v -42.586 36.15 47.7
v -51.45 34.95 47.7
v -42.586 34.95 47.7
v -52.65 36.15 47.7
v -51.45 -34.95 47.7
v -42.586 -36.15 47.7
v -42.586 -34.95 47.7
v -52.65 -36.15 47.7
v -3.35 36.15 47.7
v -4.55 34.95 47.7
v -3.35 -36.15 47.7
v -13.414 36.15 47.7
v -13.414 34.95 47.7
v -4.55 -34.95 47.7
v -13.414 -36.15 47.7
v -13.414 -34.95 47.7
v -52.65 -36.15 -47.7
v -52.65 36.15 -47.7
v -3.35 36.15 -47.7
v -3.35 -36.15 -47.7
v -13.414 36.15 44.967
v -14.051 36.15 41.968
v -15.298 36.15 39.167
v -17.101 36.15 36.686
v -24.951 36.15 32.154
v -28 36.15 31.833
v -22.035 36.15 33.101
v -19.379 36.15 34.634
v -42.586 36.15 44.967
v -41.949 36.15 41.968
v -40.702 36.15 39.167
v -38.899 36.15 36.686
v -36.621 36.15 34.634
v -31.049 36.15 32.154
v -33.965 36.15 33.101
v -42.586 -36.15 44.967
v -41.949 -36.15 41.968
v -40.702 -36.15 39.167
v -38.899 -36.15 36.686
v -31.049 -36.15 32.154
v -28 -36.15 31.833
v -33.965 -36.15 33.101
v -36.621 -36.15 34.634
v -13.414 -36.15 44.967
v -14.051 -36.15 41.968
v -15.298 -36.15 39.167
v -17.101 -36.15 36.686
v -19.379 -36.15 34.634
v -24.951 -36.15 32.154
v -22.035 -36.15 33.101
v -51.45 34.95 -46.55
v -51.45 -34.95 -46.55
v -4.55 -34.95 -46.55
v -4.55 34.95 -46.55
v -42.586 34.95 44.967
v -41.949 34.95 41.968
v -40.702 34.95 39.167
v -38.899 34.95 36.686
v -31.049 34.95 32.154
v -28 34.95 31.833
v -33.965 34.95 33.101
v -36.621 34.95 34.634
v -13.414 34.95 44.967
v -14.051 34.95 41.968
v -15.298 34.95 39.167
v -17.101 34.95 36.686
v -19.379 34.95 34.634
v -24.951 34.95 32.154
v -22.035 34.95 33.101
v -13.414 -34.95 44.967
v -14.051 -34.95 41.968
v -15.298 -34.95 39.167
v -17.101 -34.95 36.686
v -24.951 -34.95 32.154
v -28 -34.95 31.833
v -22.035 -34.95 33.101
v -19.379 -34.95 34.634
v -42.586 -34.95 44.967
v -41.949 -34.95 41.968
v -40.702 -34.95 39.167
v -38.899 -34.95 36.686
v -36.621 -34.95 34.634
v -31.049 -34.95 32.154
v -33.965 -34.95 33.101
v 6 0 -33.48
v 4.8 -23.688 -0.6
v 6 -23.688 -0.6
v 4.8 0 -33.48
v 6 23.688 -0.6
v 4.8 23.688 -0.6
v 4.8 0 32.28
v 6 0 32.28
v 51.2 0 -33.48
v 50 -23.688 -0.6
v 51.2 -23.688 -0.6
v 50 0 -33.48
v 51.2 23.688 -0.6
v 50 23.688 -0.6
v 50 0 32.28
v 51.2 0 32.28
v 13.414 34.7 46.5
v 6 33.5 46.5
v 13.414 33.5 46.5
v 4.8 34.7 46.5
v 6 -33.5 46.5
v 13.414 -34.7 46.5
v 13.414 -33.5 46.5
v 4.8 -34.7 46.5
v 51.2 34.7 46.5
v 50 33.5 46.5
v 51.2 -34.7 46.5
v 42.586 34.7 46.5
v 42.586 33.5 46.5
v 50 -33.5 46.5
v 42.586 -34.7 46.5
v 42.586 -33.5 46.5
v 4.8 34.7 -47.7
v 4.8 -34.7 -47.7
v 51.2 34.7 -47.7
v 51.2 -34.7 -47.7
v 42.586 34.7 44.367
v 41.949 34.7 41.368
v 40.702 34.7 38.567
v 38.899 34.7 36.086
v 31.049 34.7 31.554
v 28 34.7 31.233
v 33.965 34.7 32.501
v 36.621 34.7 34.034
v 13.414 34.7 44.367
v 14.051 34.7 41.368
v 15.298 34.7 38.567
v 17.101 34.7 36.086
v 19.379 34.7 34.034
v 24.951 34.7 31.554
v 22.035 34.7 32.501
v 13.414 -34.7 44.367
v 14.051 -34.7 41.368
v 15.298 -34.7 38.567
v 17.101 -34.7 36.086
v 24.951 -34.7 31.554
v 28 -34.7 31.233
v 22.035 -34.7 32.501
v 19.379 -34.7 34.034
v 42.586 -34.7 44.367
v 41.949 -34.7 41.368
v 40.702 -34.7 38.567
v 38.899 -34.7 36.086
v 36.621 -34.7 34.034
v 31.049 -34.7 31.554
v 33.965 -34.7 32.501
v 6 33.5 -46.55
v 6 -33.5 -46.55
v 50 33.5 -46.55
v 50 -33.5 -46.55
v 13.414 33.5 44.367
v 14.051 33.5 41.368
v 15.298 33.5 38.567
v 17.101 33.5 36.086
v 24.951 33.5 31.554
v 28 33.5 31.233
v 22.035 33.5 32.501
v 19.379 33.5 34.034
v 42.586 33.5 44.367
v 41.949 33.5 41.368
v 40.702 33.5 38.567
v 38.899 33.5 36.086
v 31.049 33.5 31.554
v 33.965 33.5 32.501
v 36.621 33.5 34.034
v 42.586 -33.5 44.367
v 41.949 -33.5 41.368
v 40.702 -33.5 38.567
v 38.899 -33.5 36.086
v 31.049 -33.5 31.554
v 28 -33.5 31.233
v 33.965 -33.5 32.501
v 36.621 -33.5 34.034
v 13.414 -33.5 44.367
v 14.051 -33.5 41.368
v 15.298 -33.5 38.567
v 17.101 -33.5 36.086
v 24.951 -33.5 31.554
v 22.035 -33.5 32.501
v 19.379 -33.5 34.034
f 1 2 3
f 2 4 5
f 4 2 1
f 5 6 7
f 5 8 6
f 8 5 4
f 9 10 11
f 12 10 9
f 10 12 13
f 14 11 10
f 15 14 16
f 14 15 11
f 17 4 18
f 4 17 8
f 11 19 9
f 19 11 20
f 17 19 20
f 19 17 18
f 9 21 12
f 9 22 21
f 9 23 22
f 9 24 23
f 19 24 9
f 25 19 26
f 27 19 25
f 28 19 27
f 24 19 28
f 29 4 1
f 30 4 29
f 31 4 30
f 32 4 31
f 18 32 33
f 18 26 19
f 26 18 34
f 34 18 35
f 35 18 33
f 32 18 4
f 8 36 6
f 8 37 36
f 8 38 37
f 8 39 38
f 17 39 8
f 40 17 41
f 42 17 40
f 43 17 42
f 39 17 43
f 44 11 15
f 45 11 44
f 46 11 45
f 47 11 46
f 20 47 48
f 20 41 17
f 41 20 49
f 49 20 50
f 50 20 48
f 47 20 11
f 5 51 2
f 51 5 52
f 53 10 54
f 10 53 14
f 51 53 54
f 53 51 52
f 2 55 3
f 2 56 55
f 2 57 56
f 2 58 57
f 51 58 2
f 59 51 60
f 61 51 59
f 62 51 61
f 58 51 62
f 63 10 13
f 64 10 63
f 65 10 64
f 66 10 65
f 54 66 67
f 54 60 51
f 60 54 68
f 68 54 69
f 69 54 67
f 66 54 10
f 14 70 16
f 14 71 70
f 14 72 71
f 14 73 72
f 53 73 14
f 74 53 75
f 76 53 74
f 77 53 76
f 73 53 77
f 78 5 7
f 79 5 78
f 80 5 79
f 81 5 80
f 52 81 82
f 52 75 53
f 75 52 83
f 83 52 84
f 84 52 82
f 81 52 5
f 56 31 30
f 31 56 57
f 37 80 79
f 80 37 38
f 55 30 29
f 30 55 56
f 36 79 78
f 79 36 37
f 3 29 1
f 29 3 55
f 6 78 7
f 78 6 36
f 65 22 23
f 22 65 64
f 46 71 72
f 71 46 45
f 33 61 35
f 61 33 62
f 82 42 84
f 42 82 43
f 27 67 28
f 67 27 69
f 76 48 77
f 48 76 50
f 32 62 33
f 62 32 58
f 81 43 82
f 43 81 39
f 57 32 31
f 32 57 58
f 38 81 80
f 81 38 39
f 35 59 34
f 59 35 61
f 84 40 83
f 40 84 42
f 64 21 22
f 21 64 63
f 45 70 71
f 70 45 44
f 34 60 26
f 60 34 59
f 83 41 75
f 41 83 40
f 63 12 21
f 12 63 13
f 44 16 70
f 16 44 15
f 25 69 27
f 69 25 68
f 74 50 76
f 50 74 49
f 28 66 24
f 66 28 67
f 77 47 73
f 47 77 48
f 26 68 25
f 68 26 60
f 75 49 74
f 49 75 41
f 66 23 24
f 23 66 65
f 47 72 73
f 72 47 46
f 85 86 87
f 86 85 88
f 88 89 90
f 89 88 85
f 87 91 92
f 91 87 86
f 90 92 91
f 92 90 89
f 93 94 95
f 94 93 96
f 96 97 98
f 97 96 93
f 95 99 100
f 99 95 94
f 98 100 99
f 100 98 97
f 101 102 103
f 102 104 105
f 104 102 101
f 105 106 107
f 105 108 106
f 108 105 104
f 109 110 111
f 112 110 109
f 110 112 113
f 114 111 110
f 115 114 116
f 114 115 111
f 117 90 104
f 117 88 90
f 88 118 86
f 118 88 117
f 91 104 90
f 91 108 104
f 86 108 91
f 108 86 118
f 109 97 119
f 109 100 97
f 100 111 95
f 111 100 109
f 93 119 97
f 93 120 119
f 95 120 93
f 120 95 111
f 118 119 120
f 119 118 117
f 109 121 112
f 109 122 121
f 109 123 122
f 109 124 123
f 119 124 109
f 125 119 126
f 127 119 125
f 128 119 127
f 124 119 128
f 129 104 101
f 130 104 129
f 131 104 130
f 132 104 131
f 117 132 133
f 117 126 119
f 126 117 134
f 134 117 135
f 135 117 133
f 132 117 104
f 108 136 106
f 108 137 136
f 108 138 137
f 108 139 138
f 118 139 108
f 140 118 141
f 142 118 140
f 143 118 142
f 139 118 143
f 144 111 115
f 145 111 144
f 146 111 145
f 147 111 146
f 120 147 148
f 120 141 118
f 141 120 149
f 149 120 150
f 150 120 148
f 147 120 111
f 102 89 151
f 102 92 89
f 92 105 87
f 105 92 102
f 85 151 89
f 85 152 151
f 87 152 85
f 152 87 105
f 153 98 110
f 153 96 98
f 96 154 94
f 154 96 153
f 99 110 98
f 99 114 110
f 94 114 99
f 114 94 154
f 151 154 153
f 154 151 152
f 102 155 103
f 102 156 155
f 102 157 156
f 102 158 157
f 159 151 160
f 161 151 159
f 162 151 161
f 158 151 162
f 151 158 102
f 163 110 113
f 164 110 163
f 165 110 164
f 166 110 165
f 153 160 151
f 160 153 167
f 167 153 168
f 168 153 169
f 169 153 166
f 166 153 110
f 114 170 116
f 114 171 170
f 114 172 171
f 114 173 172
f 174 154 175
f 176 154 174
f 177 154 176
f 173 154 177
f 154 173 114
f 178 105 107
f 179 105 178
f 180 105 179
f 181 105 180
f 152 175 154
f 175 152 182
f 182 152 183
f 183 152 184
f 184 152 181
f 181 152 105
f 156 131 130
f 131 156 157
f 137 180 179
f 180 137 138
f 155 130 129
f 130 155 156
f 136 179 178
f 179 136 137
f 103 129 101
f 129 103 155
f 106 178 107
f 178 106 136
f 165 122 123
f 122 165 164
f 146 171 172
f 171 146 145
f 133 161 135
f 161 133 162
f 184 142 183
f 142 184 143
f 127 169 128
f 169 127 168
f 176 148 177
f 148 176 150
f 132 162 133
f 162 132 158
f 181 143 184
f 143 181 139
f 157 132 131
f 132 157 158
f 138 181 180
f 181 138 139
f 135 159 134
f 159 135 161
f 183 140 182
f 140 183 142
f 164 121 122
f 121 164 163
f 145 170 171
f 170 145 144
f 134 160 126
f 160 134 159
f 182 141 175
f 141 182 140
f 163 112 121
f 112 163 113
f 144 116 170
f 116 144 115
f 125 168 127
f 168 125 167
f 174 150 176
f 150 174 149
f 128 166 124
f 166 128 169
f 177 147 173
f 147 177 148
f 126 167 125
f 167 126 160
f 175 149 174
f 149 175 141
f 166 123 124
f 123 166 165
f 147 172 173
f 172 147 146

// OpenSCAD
// export each separately
// box_lid(_h,_w,_d);
// box_lower(_h,_w,_d, _hasCutout);

// define card size
// Ex: MTG with sleeves 93, 67, 44
// height in mm
_h = 93;  
// width in mm
_w = 67;   
// depth/how thick is the pile of cards in mm
_d = 44 ;
// should the bottom have a cutout?
_hasCutout = 1;  // [1:yes,0:no] 
// should this thing render the top/lid of the box
_include_top = 1;  // [1:yes,0:no]
// should this thing render the bottom of the box
_include_bottom = 1;  // [1:yes,0:no]
// when rendering both top and bottom, include spacing between objects (in mm).
_object_spacing = 4;  


// cut out will save on printing material and time

//     _________________
//    /                /|
//   /                d |
//  /                /  |
// ------------------   |
// |                |   |
// |                |   |
// |                |   |
// |                h   |
// |                |   |
// |                |   |
// |                |  /
// |                | /
// |                |/
// ---------w--------




module inner_dim(h,w,d)
{
	translate([.6,0,0]) cube([h + 0.1,w,d],center=true);
	
}

module outer_dim(h,w,d)
{
	cube([h + 1.2,w + 2.4,d + 2.4],center=true);

}
module outer_lid(h,w,d)
{
	h_mod = h;
	w_mod = w + 0.5;
	d_mod = d + 0.5;
	cube([h_mod + 2.4, w_mod + 4.8,d_mod + 4.8],center=true);
	
}


module cutout(h,w,d)
{
	scale([(h/2),(w/2),1]) rotate([0,0,45]) cube([1,1,5], center=true);

}

module box_lower(h,w,d,hasCutout)
{
	difference()
	{
		outer_dim(h,w,d);
		inner_dim(h,w,d);
		translate([h/2,0,0]) 
			rotate([90,0,0]) 
				cylinder(w+40, d=d/1.5, center=true);
		
		if(hasCutout)
		{
			translate([0,0,d/2]) cutout(h,w,d);
			translate([0,0,-d/2]) cutout(h,w,d);
		}
	}

}

module box_lid(h,w,d)
{
	difference()
	{
		outer_lid(h,w,d);
		translate([.6,0,0]) outer_dim(h + .1,w+.5,d + .5);
		translate([h/2,0,0]) 
			rotate([90,0,0]) 
				cylinder(w+40, d=d/1.5, center=true);
	}
	
}

// control output for customizer
module output_top()
{
    rotate([0,-90,0]) box_lid(_h,_w,_d);
}

module output_bottom()
{
    translate([0,0,-(1.2/2)]) rotate([0,-90,0]) box_lower(_h,_w,_d, _hasCutout);
}

if(_include_top == 1 && _include_bottom == 1)
{
    translate([-(_d/2) - 2 - _object_spacing,0,0]) output_top();
    translate([(_d/2) + 2 + _object_spacing,0,0]) output_bottom();
}
else if(_include_top == 1)
{
    output_top();
}
else
{
    output_bottom(); 
}


//output_top();

//translate([30,0,0]) rotate([0,-90,0]) box_lid(_h,_w,_d);
//translate([-30,0,0])  rotate([0,-90,0]) box_lower(_h,_w,_d, _hasCutout);










